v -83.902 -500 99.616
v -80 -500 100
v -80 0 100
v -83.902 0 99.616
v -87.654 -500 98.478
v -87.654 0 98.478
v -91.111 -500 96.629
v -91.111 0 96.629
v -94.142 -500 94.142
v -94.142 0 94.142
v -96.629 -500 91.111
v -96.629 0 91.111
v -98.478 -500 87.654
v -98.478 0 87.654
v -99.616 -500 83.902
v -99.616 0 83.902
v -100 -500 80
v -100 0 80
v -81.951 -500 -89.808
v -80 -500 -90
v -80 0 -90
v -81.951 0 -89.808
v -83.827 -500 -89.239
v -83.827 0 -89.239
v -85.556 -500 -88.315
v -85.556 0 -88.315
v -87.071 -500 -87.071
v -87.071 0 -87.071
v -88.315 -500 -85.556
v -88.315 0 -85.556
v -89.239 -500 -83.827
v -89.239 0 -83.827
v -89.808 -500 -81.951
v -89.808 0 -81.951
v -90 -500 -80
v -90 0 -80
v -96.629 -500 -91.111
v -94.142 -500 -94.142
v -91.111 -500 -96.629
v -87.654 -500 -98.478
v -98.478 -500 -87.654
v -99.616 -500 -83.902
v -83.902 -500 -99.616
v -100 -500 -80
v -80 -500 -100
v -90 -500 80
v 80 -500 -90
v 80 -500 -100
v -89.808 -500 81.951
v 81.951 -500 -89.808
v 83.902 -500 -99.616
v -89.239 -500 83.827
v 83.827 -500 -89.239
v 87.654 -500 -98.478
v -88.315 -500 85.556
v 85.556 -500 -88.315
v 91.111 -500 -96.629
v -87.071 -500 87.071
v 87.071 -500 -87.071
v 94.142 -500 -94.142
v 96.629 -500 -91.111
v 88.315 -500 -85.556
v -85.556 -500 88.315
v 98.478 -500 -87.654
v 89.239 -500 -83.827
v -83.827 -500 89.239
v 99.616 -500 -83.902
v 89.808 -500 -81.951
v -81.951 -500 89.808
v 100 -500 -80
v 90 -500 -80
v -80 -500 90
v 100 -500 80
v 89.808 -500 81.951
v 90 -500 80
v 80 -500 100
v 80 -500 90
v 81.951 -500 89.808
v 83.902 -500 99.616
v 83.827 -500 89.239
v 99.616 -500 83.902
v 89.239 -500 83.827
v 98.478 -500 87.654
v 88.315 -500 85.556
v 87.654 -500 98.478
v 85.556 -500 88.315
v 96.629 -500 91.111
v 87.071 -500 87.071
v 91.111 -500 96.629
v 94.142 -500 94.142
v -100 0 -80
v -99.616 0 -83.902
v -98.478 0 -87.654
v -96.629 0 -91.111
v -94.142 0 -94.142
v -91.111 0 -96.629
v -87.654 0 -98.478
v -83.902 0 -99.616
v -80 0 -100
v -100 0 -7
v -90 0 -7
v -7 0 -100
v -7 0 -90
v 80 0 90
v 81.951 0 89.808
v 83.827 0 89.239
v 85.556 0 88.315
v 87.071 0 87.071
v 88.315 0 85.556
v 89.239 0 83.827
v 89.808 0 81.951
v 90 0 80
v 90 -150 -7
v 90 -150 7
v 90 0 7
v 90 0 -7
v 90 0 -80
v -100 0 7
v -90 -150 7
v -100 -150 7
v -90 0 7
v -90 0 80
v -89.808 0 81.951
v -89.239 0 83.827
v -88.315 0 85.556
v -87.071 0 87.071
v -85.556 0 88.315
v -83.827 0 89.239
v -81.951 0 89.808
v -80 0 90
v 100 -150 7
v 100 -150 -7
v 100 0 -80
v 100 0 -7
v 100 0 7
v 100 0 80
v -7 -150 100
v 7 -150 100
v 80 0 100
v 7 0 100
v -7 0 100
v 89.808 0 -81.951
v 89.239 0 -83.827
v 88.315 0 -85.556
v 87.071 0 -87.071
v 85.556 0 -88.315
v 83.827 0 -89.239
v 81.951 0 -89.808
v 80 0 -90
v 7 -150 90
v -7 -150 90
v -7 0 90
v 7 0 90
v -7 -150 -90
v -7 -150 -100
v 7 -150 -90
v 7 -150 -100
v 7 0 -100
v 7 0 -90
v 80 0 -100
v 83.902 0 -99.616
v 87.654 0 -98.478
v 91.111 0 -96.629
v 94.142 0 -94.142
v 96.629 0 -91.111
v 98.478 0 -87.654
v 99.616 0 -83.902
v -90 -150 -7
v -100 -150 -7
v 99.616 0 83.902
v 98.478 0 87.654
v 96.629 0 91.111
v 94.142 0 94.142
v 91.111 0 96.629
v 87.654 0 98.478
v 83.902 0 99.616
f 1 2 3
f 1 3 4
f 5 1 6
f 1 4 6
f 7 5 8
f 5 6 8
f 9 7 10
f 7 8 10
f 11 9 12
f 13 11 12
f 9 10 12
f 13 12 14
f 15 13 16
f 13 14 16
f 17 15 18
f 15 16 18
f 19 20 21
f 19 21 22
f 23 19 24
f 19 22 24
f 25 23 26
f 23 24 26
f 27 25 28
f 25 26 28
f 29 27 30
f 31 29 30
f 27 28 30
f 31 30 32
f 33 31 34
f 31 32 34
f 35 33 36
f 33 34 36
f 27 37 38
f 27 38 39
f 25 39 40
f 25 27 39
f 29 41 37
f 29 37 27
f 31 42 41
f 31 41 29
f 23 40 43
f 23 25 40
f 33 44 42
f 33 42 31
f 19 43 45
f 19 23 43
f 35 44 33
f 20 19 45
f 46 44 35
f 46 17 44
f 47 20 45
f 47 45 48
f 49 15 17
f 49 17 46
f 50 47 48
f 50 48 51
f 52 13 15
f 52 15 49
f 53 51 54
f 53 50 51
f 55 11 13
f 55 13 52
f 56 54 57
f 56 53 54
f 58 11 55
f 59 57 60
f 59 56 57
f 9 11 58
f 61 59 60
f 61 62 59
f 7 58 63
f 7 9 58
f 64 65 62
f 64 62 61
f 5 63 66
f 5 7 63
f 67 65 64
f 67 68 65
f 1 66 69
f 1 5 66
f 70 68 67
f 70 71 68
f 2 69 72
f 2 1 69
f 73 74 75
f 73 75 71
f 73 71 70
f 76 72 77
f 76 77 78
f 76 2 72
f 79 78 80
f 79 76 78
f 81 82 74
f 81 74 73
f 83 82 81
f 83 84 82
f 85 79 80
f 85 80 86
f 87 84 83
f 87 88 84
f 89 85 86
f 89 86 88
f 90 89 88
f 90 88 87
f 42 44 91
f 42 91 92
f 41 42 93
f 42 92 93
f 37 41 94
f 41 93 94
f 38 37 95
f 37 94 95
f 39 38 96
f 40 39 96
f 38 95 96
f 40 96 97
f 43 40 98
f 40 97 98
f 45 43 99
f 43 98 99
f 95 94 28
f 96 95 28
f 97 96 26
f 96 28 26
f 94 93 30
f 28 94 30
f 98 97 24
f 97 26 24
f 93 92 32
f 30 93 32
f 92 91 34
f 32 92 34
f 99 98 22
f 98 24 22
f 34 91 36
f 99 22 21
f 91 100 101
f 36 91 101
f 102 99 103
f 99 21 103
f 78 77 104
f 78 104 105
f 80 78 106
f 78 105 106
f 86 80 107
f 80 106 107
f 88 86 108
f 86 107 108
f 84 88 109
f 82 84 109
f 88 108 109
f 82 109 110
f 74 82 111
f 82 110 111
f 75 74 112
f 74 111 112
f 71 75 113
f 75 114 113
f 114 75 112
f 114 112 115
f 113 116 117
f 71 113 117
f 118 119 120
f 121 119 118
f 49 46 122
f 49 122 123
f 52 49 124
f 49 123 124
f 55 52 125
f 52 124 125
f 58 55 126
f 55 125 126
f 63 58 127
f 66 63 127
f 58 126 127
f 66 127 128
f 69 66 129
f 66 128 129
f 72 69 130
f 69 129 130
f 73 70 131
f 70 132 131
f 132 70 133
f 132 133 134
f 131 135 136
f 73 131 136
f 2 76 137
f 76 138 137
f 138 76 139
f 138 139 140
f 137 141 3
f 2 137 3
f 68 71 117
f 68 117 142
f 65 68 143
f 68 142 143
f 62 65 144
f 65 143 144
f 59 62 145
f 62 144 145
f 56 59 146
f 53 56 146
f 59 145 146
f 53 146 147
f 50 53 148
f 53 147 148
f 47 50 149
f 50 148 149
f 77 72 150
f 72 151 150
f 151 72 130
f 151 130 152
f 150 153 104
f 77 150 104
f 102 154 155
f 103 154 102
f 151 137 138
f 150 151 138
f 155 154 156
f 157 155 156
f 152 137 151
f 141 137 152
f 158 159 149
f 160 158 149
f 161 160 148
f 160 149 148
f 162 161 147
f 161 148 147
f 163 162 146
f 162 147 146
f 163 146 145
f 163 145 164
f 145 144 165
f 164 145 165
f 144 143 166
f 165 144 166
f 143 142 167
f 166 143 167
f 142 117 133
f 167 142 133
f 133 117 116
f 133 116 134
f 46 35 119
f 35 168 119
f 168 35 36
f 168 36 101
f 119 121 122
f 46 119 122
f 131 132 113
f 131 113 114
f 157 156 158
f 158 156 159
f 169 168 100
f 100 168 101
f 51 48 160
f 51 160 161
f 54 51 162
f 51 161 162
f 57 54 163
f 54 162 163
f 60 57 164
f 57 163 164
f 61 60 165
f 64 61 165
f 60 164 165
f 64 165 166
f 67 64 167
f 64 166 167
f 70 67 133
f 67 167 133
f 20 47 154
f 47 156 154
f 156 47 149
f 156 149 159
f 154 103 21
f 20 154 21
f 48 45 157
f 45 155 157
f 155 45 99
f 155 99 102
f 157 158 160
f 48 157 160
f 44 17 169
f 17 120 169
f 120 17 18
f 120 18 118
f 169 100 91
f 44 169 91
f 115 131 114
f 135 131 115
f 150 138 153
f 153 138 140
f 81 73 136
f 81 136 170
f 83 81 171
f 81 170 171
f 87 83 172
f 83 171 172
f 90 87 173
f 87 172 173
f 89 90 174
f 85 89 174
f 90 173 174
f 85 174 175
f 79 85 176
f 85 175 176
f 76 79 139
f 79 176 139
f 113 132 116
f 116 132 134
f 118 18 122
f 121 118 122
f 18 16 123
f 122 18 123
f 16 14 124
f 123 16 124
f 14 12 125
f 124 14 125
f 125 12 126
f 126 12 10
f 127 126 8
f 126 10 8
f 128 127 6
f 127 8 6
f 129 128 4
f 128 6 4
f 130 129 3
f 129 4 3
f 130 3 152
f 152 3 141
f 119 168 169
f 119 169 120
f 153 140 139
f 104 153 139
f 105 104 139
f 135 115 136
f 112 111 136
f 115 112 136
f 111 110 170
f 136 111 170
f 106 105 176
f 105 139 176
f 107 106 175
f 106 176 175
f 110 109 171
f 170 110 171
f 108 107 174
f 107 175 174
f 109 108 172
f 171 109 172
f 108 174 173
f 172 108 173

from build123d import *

# Parameters (mm, degrees)
F1_DEPTH = 500
F2_W     = 14
F2_H     = 150
F3_DEPTH = 200.001
F4_W     = 150
F4_H     = 14
F5_DEPTH = 200.001


with BuildPart() as f1:
    # F0 (on Front) → F1 (new body)
    with BuildSketch(Plane.XZ):
        with BuildLine():
            ThreePointArc((100, 80), (94.142136, 94.142136), (80, 100))
            Line((80, 100), (-80, 100))
            ThreePointArc((-80, 100), (-94.142136, 94.142136), (-100, 80))
            Line((-100, 80), (-100, -80))
            ThreePointArc((-100, -80), (-94.142136, -94.142136), (-80, -100))
            Line((-80, -100), (80, -100))
            ThreePointArc((80, -100), (94.142136, -94.142136), (100, -80))
            Line((100, -80), (100, 80))
        make_face()
        with BuildLine():
            Line((-80, 90), (80, 90))
            ThreePointArc((80, 90), (87.071068, 87.071068), (90, 80))
            Line((90, 80), (90, -80))
            ThreePointArc((90, -80), (87.071068, -87.071068), (80, -90))
            Line((80, -90), (-80, -90))
            ThreePointArc((-80, -90), (-87.071068, -87.071068), (-90, -80))
            Line((-90, -80), (-90, 80))
            ThreePointArc((-90, 80), (-87.071068, 87.071068), (-80, 90))
        make_face(mode=Mode.SUBTRACT)
    extrude(amount=F1_DEPTH)

    # F2 (on face) → F3 (cut, through all)
    with BuildSketch(Plane.XY.offset(100)):
        with Locations((0, -75)):
            Rectangle(F2_W, F2_H)
    extrude(amount=-F3_DEPTH, mode=Mode.SUBTRACT)

    # F4 (on face) → F5 (cut, through all)
    with BuildSketch(Plane.YZ.offset(100)):
        with Locations((-75, 0)):
            Rectangle(F4_W, F4_H)
    extrude(amount=-F5_DEPTH, mode=Mode.SUBTRACT)


solid = f1.part
